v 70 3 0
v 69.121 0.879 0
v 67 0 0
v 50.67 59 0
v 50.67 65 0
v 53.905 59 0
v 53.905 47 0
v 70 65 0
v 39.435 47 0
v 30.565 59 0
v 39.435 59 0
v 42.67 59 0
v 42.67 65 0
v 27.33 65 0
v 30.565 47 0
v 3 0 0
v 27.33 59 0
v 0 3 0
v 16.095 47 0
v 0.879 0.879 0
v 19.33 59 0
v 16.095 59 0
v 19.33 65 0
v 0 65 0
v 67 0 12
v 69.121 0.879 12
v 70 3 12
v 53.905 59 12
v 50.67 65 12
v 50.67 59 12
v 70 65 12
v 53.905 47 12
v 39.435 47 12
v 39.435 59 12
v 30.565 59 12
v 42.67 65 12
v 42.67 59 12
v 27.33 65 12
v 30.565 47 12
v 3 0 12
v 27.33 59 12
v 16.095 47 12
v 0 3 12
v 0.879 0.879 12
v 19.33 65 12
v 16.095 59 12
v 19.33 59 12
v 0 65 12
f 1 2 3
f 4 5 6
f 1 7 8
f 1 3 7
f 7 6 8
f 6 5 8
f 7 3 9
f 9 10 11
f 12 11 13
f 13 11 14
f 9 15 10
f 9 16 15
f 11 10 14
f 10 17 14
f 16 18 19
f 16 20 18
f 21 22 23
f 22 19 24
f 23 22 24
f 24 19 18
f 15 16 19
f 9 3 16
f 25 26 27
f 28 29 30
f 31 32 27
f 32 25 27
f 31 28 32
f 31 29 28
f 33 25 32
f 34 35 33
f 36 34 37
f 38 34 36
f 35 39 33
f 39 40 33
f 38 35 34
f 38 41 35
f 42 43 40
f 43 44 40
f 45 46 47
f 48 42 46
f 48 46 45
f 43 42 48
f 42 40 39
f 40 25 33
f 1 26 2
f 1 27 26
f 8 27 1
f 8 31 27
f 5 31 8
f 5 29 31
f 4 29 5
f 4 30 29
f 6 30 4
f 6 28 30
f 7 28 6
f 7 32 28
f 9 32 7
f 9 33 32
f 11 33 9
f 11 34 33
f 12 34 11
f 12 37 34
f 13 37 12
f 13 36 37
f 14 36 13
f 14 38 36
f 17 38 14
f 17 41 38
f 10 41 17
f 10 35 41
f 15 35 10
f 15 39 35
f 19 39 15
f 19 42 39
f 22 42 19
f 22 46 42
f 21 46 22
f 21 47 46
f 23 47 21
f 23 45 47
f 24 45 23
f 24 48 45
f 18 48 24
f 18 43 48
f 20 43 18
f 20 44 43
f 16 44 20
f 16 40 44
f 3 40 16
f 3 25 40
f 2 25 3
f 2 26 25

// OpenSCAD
$fn = 32;

// ----------------------------------------------------------------------
// Window plate: 70 x 65 mm, 2 open windows
// ----------------------------------------------------------------------

// --- parameters (mm) ---
profile_height = 12;      // extrusion height
profile_points = 24;      // points of the closed outline

profile = [[0, 3], [0.879, 0.879], [3, 0], [67, 0], [69.121, 0.879], [70, 3], [70, 65], [50.67, 65], [50.67, 59], [53.905, 59], [53.905, 47], [39.435, 47], [39.435, 59], [42.67, 59], [42.67, 65], [27.33, 65], [27.33, 59], [30.565, 59], [30.565, 47], [16.095, 47], [16.095, 59], [19.33, 59], [19.33, 65], [0, 65]];  // single closed polygon, 24 points, counter clockwise

// --- the one profile operation ---
linear_extrude(height = profile_height) polygon(points = profile);
